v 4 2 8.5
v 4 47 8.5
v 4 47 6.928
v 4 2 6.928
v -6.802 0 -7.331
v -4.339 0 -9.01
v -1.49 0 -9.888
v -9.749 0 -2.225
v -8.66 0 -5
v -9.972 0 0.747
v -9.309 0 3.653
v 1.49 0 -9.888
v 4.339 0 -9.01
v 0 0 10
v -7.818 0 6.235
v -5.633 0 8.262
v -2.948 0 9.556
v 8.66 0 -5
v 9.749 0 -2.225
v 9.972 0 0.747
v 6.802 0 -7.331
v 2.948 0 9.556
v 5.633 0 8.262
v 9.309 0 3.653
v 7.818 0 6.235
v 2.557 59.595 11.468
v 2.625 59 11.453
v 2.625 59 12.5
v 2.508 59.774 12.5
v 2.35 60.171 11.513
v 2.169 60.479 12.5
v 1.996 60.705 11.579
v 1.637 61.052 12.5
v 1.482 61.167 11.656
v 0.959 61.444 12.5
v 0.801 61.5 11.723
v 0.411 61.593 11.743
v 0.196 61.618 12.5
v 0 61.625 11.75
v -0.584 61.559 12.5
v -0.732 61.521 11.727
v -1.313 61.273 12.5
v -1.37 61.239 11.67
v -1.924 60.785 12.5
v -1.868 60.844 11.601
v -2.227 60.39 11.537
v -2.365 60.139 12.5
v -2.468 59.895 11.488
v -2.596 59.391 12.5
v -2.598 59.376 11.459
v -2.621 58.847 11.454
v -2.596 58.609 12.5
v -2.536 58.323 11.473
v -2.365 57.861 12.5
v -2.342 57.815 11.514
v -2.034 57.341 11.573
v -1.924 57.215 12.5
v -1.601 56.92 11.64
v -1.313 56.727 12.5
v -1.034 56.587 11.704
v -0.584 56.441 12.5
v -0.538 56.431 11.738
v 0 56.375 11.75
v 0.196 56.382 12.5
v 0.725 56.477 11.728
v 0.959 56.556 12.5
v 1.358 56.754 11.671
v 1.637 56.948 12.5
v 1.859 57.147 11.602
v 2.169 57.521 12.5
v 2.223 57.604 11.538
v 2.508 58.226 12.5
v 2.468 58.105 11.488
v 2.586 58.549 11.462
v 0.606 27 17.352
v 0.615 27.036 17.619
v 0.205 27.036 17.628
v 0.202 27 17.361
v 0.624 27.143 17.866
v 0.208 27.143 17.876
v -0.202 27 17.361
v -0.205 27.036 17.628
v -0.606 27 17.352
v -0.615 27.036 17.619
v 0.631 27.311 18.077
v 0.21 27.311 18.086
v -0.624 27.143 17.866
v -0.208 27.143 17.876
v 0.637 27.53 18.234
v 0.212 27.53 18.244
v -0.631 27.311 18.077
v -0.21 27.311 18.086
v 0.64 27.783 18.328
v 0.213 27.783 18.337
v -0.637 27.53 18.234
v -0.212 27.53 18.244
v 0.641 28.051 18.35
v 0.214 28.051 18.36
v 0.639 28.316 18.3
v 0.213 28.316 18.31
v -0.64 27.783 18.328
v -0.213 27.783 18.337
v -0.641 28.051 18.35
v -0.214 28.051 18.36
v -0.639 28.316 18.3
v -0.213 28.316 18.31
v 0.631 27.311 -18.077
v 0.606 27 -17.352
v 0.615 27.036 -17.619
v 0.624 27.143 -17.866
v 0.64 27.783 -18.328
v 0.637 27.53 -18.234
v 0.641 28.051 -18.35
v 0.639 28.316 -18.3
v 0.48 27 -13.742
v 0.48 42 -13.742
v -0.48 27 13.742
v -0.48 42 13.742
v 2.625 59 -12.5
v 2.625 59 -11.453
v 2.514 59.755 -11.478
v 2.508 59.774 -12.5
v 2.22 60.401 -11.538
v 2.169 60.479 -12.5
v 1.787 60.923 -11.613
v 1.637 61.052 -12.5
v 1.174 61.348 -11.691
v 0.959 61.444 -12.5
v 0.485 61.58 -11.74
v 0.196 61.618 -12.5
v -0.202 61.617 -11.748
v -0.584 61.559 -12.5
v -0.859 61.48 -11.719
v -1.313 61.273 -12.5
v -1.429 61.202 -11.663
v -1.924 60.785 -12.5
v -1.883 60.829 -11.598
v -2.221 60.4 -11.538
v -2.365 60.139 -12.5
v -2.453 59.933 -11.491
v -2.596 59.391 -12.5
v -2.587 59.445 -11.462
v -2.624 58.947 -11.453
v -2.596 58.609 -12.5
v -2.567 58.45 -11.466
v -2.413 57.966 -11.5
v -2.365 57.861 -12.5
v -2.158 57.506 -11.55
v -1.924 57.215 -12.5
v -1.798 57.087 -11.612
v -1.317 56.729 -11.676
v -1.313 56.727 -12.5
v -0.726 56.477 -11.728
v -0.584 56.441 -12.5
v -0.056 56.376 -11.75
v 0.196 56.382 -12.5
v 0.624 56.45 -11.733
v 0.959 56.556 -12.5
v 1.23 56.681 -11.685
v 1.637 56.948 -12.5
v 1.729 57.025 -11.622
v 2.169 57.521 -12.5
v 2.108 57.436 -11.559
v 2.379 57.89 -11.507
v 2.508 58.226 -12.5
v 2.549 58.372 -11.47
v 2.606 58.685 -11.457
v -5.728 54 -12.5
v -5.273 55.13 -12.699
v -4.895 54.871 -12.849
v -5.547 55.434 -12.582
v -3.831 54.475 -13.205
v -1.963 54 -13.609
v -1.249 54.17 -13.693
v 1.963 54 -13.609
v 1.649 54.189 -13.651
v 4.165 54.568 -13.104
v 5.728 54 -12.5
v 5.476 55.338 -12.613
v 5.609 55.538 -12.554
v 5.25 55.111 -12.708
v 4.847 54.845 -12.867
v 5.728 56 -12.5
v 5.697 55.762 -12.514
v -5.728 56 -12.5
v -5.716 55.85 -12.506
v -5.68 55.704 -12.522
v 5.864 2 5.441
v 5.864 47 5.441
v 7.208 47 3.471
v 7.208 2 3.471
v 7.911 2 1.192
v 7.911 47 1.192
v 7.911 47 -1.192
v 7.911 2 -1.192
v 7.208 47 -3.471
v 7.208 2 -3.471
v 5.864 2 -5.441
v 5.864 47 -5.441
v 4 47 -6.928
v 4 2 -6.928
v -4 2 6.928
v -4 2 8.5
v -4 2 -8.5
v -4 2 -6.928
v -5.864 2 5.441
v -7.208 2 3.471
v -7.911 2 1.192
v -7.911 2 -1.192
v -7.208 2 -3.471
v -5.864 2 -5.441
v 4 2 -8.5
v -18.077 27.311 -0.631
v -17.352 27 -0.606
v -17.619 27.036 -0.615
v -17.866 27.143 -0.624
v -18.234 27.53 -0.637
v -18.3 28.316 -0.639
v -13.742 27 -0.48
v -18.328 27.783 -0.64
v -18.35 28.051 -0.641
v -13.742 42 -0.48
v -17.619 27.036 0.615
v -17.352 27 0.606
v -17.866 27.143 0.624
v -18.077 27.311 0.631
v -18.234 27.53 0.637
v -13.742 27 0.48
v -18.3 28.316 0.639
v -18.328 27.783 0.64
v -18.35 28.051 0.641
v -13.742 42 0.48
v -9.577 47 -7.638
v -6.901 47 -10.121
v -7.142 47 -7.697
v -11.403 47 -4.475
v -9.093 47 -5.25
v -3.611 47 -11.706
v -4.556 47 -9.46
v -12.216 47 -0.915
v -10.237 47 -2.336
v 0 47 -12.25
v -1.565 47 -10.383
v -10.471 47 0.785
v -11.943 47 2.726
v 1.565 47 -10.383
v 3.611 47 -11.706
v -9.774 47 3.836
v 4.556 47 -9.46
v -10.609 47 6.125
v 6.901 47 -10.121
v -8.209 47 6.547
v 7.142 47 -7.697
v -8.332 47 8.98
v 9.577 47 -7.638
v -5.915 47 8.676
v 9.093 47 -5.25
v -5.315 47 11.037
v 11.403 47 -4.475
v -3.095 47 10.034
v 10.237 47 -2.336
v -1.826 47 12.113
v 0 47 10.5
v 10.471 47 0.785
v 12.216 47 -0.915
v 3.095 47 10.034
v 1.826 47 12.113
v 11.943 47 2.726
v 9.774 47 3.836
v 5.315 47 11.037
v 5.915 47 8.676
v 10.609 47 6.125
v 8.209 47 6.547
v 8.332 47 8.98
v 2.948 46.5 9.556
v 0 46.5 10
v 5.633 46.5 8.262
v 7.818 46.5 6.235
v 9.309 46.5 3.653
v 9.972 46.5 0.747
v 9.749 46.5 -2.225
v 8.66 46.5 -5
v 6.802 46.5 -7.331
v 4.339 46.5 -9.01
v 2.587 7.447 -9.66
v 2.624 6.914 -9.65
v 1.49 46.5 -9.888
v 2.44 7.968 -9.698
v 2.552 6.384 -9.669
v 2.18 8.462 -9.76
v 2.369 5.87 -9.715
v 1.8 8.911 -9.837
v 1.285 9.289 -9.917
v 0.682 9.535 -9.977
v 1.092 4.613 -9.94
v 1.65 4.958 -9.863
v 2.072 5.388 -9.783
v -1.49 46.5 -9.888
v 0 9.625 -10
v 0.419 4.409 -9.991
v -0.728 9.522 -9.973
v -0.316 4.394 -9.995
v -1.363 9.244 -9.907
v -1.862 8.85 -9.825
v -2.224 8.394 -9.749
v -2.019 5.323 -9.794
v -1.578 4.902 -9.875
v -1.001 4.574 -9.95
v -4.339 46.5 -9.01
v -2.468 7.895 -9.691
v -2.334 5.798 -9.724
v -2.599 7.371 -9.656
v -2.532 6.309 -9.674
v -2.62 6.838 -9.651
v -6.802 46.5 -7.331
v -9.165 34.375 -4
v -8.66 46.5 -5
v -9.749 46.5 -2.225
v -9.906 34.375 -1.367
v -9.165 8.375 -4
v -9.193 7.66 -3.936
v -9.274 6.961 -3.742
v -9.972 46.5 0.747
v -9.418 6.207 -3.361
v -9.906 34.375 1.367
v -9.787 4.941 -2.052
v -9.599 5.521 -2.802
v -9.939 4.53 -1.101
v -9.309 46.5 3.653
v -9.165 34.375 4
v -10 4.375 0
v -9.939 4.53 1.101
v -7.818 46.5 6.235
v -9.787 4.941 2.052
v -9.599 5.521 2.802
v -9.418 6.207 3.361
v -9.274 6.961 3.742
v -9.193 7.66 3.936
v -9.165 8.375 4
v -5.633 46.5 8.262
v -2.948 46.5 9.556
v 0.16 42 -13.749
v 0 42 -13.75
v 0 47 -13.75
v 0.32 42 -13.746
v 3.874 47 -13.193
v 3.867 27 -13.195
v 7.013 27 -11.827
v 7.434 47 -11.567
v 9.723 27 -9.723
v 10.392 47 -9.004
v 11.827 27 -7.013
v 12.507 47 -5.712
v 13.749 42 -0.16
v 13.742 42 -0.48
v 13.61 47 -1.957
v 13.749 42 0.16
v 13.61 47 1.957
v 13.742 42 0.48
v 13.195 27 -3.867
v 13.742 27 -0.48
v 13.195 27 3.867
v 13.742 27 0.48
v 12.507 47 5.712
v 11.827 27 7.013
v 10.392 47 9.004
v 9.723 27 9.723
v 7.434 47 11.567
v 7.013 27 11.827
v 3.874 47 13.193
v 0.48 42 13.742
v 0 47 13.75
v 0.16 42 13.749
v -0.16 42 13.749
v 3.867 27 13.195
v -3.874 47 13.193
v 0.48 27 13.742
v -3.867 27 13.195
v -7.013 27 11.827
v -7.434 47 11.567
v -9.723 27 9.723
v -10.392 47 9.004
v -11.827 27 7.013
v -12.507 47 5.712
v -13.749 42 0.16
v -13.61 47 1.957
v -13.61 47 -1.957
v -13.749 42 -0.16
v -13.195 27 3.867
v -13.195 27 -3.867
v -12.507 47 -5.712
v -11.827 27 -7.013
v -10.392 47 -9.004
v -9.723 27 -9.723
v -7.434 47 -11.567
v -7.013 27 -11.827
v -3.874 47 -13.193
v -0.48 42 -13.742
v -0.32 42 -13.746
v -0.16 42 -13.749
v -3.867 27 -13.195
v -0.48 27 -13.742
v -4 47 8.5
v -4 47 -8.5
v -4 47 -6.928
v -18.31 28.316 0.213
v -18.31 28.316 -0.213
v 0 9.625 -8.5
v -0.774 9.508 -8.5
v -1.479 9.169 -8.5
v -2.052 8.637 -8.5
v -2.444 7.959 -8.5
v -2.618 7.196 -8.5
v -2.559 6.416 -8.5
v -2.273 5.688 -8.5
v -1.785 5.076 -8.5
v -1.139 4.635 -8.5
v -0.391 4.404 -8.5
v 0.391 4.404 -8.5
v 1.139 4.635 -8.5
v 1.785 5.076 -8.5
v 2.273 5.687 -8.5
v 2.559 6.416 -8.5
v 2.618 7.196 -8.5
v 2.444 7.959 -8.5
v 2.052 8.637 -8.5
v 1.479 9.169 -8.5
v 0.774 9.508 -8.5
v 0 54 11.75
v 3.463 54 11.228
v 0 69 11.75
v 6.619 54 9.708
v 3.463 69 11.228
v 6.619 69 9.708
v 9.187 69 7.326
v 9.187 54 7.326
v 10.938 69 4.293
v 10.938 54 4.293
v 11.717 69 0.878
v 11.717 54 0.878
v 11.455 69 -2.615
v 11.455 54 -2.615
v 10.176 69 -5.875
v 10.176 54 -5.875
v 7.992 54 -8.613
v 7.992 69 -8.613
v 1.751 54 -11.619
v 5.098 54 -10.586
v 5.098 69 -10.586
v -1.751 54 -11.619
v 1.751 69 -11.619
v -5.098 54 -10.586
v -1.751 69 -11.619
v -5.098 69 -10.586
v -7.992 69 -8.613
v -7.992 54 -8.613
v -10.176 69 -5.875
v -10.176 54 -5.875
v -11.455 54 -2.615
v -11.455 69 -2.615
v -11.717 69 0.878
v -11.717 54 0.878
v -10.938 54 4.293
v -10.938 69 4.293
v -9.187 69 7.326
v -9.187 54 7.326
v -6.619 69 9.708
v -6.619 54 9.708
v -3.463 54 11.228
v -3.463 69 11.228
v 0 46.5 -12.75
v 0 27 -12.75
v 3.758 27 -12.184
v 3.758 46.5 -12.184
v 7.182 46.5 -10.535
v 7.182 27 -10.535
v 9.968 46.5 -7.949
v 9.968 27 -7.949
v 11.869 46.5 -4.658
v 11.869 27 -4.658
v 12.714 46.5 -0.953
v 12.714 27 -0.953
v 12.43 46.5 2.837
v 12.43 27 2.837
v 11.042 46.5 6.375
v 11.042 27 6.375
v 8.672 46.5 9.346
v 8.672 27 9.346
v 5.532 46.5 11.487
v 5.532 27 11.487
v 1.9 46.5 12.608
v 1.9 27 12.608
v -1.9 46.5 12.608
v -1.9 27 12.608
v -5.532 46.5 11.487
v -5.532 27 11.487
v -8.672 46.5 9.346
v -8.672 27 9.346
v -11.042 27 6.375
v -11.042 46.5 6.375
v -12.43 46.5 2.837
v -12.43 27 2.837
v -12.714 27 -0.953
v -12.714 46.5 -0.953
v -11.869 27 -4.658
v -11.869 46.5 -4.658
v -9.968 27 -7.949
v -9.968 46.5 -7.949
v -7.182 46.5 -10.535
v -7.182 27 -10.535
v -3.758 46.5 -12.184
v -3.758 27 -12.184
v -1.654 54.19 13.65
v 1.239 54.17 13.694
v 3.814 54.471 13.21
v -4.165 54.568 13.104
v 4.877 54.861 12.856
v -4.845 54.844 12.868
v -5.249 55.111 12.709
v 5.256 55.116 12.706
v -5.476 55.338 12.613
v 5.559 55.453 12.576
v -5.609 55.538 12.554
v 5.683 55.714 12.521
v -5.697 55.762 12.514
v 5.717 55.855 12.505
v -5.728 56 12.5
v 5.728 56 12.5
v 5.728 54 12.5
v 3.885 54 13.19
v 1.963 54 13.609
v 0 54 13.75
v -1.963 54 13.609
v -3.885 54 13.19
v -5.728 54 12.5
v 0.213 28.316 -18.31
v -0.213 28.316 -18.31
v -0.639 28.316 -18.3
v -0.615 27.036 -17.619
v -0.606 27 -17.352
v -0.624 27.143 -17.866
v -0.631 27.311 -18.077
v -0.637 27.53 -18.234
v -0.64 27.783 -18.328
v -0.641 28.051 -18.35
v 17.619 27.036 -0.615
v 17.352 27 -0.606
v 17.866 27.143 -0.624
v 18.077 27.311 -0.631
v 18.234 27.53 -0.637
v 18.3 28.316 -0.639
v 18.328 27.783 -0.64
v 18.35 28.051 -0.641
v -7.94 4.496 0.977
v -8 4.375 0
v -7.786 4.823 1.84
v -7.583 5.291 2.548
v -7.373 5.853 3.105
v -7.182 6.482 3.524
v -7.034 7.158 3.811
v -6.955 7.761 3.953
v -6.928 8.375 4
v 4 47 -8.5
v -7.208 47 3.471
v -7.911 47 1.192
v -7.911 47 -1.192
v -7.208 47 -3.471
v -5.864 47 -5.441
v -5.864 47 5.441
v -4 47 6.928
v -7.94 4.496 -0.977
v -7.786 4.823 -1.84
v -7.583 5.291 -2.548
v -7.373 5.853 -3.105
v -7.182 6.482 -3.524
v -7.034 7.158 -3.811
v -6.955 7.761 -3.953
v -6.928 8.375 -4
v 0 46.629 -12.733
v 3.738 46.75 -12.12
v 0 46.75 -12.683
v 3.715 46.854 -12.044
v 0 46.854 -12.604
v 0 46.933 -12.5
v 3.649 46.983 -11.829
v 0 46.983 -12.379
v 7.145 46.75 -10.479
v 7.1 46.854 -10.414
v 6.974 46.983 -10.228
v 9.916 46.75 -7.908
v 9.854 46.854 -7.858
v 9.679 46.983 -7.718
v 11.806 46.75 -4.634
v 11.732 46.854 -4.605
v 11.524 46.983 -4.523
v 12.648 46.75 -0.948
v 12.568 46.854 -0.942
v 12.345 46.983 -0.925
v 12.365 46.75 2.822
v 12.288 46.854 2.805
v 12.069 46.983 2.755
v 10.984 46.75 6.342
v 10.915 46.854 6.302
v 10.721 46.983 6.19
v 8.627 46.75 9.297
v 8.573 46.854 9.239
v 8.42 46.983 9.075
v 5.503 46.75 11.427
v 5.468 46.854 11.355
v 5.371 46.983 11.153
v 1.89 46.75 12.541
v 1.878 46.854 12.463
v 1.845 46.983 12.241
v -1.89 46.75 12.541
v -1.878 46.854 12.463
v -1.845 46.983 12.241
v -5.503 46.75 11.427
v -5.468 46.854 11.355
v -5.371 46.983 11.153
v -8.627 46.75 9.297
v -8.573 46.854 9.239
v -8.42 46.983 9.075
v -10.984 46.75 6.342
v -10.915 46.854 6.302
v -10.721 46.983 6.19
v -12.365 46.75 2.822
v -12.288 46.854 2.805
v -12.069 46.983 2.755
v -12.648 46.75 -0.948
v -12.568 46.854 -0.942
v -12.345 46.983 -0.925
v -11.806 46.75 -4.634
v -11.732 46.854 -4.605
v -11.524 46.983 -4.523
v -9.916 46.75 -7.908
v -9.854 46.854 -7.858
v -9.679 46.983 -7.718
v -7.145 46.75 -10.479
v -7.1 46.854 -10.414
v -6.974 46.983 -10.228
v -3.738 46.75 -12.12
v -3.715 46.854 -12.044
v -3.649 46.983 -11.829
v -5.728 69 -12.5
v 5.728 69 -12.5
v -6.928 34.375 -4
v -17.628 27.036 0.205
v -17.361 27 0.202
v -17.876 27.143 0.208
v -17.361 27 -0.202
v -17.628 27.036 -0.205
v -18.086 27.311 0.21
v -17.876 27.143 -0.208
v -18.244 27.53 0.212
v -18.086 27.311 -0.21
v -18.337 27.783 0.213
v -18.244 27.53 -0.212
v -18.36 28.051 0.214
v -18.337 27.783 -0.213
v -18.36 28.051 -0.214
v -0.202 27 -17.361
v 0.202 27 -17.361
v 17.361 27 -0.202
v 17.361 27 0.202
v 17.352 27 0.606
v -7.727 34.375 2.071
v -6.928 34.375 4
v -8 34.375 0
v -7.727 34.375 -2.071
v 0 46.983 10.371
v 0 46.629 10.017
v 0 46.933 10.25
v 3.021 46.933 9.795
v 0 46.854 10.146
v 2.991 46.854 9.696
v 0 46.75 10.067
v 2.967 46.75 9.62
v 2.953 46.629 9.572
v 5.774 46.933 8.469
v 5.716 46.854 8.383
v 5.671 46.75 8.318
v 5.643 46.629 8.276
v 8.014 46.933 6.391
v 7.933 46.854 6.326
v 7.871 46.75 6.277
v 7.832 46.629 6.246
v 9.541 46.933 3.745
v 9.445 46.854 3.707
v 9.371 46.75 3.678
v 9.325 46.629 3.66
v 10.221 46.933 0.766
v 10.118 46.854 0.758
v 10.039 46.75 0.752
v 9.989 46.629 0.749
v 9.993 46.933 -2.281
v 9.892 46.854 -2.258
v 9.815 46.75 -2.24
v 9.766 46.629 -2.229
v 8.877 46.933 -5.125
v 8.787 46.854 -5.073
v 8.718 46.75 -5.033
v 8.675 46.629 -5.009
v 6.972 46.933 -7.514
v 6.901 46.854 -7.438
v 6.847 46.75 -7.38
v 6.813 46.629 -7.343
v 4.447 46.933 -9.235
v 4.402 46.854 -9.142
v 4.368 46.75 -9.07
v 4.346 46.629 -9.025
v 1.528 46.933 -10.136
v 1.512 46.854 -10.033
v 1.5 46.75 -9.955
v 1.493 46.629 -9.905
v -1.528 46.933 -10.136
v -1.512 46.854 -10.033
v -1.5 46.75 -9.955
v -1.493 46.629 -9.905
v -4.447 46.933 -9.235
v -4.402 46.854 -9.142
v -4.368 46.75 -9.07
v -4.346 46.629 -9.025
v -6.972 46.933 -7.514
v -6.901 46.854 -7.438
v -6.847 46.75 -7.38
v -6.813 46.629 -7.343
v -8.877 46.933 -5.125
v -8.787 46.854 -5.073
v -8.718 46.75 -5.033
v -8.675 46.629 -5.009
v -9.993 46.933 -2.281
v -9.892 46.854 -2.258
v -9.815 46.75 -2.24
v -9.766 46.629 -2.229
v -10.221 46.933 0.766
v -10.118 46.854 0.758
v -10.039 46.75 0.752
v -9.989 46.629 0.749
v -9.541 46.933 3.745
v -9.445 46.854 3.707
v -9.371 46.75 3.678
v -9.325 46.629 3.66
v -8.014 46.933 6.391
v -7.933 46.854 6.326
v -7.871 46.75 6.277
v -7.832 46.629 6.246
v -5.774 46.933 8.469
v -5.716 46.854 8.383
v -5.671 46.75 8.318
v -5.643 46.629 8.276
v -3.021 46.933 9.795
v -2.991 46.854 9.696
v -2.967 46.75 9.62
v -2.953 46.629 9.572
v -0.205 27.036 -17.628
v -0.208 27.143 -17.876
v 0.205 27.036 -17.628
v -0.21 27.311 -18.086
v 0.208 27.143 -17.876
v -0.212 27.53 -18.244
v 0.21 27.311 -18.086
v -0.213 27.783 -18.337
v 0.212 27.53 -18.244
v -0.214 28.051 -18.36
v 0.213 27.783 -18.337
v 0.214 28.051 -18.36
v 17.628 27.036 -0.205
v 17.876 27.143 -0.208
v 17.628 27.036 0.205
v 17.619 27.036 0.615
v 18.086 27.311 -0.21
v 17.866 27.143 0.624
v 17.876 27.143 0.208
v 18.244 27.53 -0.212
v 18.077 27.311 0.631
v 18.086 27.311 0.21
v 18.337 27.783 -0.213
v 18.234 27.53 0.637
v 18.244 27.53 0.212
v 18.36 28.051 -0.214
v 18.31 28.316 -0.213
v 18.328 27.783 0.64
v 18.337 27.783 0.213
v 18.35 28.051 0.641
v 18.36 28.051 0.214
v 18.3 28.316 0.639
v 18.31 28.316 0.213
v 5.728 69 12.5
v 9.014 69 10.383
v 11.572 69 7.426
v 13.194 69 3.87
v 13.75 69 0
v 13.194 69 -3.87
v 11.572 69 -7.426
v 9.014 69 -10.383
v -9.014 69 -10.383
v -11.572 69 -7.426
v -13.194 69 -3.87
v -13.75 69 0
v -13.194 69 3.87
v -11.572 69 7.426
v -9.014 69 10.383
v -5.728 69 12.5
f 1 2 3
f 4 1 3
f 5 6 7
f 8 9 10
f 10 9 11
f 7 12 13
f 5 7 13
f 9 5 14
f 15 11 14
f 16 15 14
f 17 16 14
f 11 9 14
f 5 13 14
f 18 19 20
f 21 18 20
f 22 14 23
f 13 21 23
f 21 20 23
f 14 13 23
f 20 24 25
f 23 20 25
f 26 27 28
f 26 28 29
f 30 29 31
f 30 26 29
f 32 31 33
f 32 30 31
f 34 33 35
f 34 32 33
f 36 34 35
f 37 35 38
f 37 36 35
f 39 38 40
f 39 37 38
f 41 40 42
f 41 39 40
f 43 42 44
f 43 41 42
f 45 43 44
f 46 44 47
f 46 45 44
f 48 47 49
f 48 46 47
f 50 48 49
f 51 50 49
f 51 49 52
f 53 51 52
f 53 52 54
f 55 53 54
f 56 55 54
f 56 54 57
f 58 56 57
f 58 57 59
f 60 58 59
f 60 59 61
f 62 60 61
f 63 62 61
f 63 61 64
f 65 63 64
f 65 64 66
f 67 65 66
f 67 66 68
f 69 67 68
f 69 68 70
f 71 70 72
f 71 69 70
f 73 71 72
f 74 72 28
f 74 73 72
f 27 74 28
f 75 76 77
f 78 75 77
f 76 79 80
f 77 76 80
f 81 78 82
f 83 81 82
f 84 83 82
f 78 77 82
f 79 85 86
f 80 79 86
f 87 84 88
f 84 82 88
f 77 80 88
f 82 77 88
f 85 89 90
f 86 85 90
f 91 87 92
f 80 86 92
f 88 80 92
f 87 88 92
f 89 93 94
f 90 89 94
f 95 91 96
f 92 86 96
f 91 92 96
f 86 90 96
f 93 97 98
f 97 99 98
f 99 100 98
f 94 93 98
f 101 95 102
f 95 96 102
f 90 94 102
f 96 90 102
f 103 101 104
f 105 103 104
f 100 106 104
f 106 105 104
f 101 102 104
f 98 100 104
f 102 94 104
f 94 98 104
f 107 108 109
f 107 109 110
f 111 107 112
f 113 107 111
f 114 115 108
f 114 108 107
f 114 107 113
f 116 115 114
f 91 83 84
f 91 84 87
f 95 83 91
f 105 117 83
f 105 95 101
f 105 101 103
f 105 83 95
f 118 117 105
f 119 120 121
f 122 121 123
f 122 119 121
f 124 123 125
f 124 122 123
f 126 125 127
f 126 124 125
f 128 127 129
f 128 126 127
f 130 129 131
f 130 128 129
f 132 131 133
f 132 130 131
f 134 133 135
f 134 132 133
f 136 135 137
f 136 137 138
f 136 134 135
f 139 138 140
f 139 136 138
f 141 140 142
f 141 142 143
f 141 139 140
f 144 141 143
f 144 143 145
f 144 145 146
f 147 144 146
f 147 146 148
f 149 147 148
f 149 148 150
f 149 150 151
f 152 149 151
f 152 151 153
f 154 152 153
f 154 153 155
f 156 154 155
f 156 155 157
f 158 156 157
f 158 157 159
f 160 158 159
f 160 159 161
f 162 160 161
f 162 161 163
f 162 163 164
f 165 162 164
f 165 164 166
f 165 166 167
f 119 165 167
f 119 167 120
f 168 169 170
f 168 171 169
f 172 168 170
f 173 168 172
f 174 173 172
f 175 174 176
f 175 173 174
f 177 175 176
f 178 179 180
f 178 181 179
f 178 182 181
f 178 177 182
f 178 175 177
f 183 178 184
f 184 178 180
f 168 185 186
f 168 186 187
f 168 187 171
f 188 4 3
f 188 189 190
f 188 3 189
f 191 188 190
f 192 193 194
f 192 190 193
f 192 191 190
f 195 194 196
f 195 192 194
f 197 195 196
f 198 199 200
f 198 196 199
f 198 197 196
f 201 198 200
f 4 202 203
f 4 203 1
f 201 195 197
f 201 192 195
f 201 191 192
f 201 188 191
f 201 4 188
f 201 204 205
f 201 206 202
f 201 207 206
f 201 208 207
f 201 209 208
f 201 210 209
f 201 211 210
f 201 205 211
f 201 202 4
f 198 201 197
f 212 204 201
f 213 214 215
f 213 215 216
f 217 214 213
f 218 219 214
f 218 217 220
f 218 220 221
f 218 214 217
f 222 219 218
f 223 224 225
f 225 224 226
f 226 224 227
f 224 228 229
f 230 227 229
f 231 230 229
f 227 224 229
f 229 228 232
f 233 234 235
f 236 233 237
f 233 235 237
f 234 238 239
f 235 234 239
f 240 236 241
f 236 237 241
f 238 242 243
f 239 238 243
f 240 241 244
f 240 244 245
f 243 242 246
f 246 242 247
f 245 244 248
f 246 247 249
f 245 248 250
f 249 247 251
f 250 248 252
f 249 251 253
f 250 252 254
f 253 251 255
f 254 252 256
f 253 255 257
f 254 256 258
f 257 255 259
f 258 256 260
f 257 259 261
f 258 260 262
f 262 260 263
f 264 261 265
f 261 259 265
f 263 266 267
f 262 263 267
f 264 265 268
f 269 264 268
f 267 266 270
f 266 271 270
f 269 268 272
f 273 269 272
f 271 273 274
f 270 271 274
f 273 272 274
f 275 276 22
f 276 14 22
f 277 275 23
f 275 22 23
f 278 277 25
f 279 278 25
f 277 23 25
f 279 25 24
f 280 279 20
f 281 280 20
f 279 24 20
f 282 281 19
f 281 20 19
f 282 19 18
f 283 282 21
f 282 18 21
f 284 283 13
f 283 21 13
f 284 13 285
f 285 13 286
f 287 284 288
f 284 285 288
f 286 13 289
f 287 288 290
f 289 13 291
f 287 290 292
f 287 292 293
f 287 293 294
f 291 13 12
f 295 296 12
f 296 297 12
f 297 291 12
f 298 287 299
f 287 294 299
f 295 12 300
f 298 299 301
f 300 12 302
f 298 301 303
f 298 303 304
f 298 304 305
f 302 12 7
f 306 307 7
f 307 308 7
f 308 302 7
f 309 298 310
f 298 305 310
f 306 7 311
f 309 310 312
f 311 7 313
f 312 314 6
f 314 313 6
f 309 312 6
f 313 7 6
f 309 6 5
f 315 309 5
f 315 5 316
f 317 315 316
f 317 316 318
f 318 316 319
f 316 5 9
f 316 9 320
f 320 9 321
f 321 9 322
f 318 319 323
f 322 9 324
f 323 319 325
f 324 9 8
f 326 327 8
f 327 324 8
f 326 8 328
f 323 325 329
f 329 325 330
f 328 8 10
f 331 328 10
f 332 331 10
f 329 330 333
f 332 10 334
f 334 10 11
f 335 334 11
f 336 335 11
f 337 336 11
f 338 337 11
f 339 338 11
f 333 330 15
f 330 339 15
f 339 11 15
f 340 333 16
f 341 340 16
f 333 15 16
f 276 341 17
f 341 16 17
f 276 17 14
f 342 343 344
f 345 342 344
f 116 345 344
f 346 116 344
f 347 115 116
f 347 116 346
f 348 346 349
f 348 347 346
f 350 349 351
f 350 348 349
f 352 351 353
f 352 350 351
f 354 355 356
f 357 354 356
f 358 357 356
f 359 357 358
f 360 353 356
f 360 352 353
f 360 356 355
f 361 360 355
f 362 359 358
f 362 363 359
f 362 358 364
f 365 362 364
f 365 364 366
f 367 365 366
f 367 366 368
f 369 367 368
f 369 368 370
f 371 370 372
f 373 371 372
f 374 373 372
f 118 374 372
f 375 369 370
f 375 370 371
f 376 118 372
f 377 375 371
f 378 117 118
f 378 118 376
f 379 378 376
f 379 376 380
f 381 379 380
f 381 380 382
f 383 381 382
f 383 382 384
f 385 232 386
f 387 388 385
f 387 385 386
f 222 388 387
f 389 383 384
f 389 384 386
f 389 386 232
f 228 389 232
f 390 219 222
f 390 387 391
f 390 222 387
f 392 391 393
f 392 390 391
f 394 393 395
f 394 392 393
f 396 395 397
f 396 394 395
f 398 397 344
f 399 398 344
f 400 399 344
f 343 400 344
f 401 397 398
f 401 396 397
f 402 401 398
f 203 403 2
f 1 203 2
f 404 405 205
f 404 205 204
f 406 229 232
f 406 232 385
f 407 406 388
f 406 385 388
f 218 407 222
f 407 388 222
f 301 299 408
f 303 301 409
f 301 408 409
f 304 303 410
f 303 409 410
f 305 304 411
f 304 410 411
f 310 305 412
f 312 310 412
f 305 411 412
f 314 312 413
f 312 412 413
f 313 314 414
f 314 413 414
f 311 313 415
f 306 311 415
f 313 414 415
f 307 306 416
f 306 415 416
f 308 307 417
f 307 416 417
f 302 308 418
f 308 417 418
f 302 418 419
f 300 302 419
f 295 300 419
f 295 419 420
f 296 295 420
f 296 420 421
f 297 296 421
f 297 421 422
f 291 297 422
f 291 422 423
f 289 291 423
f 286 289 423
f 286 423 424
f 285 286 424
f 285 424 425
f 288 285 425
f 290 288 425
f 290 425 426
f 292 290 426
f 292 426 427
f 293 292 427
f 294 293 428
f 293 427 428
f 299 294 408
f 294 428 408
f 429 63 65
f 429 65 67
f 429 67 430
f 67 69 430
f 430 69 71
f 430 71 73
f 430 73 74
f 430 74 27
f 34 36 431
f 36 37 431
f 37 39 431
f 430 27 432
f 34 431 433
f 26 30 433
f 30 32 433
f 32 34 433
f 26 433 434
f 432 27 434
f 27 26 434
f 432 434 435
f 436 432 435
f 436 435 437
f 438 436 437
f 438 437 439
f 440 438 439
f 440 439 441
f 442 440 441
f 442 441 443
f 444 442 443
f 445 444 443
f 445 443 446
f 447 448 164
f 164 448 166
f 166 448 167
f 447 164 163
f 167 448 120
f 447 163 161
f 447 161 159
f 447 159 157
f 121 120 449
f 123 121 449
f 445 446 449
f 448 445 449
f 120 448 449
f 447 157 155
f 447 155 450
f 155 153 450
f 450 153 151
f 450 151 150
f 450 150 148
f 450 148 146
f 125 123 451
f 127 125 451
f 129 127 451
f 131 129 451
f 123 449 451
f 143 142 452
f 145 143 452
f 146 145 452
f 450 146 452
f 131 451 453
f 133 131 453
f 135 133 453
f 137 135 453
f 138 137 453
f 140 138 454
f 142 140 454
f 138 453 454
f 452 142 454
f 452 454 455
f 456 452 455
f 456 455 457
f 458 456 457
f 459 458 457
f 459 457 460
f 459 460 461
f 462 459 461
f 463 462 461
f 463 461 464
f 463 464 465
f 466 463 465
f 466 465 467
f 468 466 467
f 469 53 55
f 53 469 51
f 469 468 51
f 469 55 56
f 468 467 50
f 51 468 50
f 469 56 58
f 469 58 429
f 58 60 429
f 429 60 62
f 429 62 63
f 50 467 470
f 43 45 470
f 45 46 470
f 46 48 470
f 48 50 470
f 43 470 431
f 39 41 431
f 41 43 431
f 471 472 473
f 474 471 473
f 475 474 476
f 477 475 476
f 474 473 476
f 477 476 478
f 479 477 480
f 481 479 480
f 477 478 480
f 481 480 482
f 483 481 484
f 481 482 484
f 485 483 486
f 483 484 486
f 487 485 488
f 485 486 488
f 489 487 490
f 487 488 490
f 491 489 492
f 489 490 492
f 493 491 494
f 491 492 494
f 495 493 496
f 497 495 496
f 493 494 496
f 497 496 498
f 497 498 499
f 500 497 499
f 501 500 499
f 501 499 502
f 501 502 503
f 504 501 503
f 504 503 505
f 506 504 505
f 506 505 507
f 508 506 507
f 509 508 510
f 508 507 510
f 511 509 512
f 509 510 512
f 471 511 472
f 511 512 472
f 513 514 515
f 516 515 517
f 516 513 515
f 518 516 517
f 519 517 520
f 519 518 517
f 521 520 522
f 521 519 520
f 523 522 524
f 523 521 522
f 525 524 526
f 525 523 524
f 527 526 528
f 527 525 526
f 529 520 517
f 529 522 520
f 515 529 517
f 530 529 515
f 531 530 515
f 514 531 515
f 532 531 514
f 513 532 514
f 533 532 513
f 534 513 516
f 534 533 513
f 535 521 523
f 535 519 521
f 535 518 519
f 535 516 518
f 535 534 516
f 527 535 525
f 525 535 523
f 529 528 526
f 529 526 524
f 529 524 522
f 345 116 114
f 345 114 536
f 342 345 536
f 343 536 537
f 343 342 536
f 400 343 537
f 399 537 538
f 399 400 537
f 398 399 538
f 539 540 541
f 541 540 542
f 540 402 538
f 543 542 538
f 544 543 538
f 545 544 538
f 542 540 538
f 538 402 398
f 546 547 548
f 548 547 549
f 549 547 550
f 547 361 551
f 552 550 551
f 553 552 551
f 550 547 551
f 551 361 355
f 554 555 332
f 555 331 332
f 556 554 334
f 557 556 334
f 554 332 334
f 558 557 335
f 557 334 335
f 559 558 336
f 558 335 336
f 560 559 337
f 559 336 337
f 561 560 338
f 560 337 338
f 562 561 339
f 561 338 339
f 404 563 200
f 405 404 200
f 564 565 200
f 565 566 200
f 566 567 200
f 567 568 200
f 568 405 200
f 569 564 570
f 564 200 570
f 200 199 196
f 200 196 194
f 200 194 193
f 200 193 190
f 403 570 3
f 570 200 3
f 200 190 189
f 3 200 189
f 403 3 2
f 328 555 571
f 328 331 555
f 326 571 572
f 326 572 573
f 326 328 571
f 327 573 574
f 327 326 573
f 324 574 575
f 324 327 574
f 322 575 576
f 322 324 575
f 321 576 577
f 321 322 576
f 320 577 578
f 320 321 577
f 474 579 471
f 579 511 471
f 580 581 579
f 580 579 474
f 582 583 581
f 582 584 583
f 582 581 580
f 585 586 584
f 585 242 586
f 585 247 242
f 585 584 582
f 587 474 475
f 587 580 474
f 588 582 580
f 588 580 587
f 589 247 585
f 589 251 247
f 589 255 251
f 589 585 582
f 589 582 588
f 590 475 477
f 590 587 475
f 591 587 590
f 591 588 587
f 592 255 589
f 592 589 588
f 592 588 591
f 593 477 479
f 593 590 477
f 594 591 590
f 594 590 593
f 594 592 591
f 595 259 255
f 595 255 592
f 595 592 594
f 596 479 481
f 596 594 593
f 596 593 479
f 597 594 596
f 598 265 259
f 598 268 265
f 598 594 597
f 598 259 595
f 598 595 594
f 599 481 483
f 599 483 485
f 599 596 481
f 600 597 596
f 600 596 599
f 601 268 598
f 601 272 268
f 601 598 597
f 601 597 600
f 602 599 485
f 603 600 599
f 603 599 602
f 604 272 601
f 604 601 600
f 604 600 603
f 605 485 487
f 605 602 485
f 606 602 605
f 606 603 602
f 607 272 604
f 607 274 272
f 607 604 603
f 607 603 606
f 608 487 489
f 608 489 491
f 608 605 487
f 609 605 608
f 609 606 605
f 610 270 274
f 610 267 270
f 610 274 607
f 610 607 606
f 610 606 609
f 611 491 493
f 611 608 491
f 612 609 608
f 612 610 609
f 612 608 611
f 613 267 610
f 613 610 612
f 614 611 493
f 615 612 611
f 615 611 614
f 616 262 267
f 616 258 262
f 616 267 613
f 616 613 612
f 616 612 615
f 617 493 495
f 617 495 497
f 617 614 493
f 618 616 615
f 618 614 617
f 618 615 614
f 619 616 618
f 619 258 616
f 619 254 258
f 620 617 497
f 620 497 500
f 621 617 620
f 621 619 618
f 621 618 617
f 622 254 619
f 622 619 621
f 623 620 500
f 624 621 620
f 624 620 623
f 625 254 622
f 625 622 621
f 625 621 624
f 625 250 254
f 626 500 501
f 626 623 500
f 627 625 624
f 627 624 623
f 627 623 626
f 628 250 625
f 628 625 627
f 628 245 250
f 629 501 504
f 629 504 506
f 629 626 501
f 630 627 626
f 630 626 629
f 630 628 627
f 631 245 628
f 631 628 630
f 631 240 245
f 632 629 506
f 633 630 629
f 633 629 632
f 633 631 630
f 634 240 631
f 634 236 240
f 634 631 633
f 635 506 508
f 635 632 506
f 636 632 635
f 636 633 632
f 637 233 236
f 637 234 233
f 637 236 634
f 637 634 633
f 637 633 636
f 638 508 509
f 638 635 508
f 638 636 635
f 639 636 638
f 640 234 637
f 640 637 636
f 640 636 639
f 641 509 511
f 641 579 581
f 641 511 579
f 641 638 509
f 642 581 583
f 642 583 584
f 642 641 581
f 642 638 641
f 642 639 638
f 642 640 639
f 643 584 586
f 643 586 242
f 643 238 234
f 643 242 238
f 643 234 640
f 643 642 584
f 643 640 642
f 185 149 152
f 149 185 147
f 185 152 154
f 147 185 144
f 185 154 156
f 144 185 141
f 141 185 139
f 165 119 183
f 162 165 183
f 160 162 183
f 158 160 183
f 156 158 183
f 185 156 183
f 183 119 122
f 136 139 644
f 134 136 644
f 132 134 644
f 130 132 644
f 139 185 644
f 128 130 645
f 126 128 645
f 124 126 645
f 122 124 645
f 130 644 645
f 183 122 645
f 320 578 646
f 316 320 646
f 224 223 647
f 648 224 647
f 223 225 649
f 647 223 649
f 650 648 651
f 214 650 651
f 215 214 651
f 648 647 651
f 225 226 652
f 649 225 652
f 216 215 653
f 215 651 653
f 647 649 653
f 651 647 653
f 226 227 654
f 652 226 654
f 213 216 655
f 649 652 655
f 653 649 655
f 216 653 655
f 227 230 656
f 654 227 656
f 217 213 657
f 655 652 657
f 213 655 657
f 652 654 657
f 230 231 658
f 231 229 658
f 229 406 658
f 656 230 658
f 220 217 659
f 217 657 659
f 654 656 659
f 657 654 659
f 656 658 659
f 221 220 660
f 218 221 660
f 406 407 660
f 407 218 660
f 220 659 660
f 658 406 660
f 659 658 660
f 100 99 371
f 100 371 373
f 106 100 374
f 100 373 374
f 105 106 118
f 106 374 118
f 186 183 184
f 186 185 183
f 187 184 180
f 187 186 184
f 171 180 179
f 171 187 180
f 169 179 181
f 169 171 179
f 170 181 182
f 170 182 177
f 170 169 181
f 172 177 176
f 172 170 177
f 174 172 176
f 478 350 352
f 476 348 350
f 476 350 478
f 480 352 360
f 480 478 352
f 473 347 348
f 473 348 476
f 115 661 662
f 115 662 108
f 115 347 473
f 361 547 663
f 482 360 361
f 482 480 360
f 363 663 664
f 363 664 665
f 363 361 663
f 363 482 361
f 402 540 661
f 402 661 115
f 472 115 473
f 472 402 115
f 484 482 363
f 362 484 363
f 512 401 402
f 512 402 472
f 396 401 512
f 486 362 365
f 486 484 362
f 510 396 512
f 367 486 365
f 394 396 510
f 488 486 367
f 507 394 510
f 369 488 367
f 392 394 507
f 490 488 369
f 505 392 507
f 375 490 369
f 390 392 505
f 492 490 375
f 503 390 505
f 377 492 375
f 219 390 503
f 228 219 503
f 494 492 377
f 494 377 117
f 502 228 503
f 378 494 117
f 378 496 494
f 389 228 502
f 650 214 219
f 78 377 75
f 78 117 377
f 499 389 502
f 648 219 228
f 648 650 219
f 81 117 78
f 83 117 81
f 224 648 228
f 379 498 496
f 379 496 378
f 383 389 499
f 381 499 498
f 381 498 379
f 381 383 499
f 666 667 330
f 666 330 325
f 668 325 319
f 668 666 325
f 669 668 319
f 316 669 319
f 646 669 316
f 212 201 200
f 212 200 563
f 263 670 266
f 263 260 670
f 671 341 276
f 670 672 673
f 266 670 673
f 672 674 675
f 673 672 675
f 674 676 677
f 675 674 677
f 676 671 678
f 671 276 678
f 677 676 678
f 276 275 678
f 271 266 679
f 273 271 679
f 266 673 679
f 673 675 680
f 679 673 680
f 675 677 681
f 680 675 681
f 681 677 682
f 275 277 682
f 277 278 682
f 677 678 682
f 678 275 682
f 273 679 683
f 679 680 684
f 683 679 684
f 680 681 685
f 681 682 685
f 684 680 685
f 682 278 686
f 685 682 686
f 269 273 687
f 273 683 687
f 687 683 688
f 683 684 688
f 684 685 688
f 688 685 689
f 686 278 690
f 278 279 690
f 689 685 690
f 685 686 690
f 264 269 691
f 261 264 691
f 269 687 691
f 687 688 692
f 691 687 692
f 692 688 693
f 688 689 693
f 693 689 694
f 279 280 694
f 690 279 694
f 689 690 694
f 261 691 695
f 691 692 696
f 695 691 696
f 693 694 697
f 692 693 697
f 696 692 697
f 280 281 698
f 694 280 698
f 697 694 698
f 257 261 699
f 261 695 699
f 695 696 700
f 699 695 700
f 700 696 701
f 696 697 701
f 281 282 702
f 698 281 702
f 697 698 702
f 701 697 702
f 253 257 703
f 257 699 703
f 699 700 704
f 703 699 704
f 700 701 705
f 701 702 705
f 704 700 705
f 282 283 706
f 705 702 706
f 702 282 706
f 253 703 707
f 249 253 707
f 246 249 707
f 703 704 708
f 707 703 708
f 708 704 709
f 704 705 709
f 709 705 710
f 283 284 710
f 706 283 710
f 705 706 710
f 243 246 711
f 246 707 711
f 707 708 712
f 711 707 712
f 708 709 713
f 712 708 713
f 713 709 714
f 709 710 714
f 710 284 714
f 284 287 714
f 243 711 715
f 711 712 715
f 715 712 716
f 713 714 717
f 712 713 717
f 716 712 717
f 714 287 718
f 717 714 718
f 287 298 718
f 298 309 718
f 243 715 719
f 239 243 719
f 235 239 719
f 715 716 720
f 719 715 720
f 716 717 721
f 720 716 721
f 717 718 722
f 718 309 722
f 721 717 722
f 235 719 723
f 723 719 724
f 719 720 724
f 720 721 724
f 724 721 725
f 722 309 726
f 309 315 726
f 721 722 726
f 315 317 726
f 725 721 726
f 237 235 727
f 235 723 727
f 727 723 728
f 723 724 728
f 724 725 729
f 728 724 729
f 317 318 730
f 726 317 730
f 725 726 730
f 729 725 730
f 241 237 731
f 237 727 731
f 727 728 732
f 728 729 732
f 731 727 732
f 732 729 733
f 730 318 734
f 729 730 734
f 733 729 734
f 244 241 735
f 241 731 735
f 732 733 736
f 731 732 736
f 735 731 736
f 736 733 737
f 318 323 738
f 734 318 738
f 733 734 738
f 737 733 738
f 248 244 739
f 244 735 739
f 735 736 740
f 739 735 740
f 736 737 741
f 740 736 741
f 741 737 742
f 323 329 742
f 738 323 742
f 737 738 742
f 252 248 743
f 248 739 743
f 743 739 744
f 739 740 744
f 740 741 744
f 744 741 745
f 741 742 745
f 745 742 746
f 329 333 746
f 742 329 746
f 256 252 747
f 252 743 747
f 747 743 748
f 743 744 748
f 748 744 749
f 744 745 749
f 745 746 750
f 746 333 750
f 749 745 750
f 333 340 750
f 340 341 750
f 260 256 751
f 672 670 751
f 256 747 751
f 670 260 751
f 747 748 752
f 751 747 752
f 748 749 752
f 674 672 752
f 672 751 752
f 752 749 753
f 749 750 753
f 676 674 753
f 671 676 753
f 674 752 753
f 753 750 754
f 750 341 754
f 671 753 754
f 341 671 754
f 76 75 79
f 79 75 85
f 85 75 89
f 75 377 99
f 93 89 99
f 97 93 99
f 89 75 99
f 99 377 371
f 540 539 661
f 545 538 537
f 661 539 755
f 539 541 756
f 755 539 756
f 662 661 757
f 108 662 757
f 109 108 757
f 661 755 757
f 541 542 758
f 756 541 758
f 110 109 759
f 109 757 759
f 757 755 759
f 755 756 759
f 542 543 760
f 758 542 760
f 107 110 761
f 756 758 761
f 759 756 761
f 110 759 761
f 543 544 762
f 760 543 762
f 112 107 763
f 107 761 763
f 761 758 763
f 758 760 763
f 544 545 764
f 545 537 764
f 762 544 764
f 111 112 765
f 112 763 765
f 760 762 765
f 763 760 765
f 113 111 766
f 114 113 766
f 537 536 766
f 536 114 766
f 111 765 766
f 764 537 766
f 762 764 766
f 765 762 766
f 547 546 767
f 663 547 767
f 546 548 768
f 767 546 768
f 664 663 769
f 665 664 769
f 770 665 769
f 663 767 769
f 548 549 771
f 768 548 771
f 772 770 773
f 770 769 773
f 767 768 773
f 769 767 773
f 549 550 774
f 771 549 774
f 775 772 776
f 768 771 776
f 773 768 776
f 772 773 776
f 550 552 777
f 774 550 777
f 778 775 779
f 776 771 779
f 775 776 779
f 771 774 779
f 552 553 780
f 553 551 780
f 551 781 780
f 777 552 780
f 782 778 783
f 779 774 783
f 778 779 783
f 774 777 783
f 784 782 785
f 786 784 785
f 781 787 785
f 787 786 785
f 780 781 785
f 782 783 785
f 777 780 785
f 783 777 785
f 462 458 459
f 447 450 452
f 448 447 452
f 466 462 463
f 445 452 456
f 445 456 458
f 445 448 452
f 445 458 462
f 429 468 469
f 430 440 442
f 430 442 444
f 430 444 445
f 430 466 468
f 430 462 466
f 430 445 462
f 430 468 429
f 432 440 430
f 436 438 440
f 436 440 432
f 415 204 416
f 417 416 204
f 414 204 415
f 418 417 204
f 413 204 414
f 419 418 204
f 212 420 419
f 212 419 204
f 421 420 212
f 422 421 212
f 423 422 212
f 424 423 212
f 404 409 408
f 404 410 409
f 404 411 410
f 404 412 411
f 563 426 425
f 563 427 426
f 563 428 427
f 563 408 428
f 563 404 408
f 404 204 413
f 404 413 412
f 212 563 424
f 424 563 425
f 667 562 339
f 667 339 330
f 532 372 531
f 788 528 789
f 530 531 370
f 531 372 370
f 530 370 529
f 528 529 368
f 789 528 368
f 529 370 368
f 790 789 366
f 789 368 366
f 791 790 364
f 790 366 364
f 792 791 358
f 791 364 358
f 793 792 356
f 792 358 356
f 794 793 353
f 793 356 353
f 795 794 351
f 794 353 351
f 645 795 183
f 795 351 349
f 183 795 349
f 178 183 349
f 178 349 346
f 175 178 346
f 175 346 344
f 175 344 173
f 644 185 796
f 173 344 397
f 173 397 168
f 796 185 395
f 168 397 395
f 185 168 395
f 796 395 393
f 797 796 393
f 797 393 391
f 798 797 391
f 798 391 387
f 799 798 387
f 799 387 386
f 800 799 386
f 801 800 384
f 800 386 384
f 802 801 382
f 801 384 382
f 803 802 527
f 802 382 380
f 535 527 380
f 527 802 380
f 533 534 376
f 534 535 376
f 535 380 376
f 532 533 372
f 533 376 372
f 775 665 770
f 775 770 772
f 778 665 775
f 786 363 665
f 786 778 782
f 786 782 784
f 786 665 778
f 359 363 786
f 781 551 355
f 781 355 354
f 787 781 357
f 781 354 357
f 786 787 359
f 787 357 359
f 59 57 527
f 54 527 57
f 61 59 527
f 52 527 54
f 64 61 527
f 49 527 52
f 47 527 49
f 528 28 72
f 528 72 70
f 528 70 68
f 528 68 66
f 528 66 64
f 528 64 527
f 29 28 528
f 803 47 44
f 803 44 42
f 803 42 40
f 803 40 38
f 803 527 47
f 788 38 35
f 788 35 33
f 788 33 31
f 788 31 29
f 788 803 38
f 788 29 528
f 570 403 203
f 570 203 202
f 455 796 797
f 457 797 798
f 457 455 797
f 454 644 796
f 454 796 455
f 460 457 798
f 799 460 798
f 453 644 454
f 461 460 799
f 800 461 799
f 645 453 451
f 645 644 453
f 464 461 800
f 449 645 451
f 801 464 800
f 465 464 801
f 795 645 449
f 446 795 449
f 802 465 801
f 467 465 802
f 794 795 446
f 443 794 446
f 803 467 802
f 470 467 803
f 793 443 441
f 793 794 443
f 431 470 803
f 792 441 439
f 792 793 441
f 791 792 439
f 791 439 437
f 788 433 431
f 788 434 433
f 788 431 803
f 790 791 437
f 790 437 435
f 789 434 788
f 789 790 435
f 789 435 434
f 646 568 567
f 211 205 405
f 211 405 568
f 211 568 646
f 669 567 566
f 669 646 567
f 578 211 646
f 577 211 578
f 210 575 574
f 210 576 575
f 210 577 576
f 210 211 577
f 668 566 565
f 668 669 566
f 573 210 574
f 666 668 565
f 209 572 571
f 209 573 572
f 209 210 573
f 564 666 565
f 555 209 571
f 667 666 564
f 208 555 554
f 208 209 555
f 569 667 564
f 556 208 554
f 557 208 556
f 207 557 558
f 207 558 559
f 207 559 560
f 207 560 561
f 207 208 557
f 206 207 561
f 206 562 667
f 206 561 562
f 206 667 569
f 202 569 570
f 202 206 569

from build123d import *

# Parameters (mm, degrees)
SKETCH1_R                = 10
BOSS_EXTRUDE1_DEPTH      = 47
SHELL1_T                 = -2
SKETCH2_W                = 8
SKETCH2_H                = 17
CUT_EXTRUDE1_DEPTH       = 45
SKETCH3_R                = 2.625
CUT_EXTRUDE2_DEPTH       = 50.081564767
SKETCH4_R                = 13.75
BOSS_EXTRUDE2_DEPTH      = 22
BOSS_EXTRUDE3_START      = 20
SKETCH5_R                = 13.75
SKETCH5_R_2              = 12.75
BOSS_EXTRUDE3_DEPTH      = 20
FILLET1_R                = 0.5
SKETCH6_W                = 8
SKETCH6_H                = 30
CUT_EXTRUDE3_DEPTH       = 10
FILLET2_R                = 4
REVOLVE5_ANGLE           = 4
FILLET3_R                = 1
CIRPATTERN1_COUNT        = 4
FILLET3_OF_CIRPATTERN1_R = 1
SKETCH9_R                = 11.75
CUT_EXTRUDE4_DEPTH       = 15
CUT_EXTRUDE6_DEPTH       = 74.724950074
CUT_EXTRUDE6_DEPTH_BACK  = 74.724950074
SKETCH10_R               = 2.625
SKETCH11_W               = 15
SKETCH11_H               = 2
CUT_EXTRUDE7_DEPTH       = 15
FILLET4_R                = 2


# Some blends are built 0.0001 mm under size
with BuildPart() as part:
    # Sketch1 → Boss-Extrude1 (new body)
    with BuildSketch(Plane(origin=(0, 0, 0), x_dir=(1, 0, 0), z_dir=(0, 1, 0))):
        with Locations(Location((0, 0, 0), (0, 0, 270))):
            Circle(SKETCH1_R)
    extrude(amount=BOSS_EXTRUDE1_DEPTH)

    # Shell1
    shell1_openings = [part.faces().sort_by_distance(p)[0] for p in [
        (0, 47, 0),
    ]]
    offset(amount=SHELL1_T, openings=shell1_openings, kind=Kind.INTERSECTION)

    # Sketch2 → Cut-Extrude1 (cut)
    with BuildSketch(Plane(origin=(0, 47, 0), x_dir=(1, 0, 0), z_dir=(0, 1, 0))):
        Rectangle(SKETCH2_W, SKETCH2_H)
    extrude(amount=-CUT_EXTRUDE1_DEPTH, mode=Mode.SUBTRACT)

    # Sketch3 → Cut-Extrude2 (cut, through all)
    with BuildSketch(Plane.XY):
        with Locations(Location((0, 7, 0), (0, 0, 90))):
            Circle(SKETCH3_R)
    extrude(amount=-CUT_EXTRUDE2_DEPTH, mode=Mode.SUBTRACT)

    # Sketch4 → Boss-Extrude2 (add)
    with BuildSketch(Plane(origin=(0, 47, 0), x_dir=(1, 0, 0), z_dir=(0, 1, 0))):
        with Locations(Location((0, 0, 0), (0, 0, 270))):
            Circle(SKETCH4_R)
    extrude(amount=BOSS_EXTRUDE2_DEPTH)

    # Sketch5 → Boss-Extrude3 (add)
    with BuildSketch(Plane.XZ.offset(-47).offset(BOSS_EXTRUDE3_START)):
        with Locations(Location((0, 0, 0), (0, 0, 270))):
            Circle(SKETCH5_R)
        with Locations(Location((0, 0, 0), (0, 0, 270))):
            Circle(SKETCH5_R_2, mode=Mode.SUBTRACT)
    extrude(amount=-BOSS_EXTRUDE3_DEPTH)

    # Fillet1
    fillet1_edges = [part.edges().sort_by_distance(p)[0] for p in [
        (0, 47, -10),
        (0, 47, 12.75),
    ]]
    fillet(fillet1_edges, radius=FILLET1_R)

    # Sketch6 → Cut-Extrude3 (cut)
    with BuildSketch(Plane(origin=(0, 0, 0), x_dir=(0, 0, -1), z_dir=(1, 0, 0))):
        with Locations((0, 19.375)):
            Rectangle(SKETCH6_W, SKETCH6_H)
    extrude(amount=-CUT_EXTRUDE3_DEPTH, mode=Mode.SUBTRACT)

    # Fillet2
    fillet2_edges = [part.edges().sort_by_distance(p)[0] for p in [
        (-8.04667731, 4.375, 4),
        (-8.04667731, 4.375, -4),
    ]]
    fillet(fillet2_edges, radius=FILLET2_R - 0.0001)  # a hair under: the kernel refuses the full size

    # Sketch8 → Revolve5 (revolve, symmetric)
    with BuildSketch(Plane(origin=(0, 0, 0), x_dir=(0, 0, -1), z_dir=(1, 0, 0))) as revolve5_sk:
        Polygon((13.75, 27), (18.75, 27), (13.75, 42), align=None)
    revolve5 = revolve(axis=Axis((0, 88.2, 0), (0, -1, 0)), revolution_arc=REVOLVE5_ANGLE / 2)
    revolve5 = revolve5 + revolve(revolve5_sk.sketch, axis=Axis((0, 88.2, 0), (0, 1, 0)), revolution_arc=REVOLVE5_ANGLE / 2)

    # Fillet3
    fillet3_edges = [part.edges().sort_by_distance(p)[0] for p in [
        (0, 27, -18.75),
    ]]
    fillet(fillet3_edges, radius=FILLET3_R)

    # CirPattern1: Revolve5 ×4 about axis
    cirpattern1_axis = Axis((0, 88.2, 0), (0, -1, 0))
    for i in range(1, CIRPATTERN1_COUNT):
        add(revolve5.rotate(cirpattern1_axis, i * 360 / CIRPATTERN1_COUNT))

    # Fillet3 of CirPattern1
    fillet3_of_cirpattern1_edges = [part.edges().sort_by_distance(p)[0] for p in [
        (18.75, 27, 0),
        (0, 27, 18.75),
        (-18.75, 27, 0),
    ]]
    fillet(fillet3_of_cirpattern1_edges, radius=FILLET3_OF_CIRPATTERN1_R)

    # Sketch9 → Cut-Extrude4 (cut)
    with BuildSketch(Plane(origin=(0, 69, 0), x_dir=(1, 0, 0), z_dir=(0, 1, 0))):
        with Locations(Location((0, 0, 0), (0, 0, 270))):
            Circle(SKETCH9_R)
    extrude(amount=-CUT_EXTRUDE4_DEPTH, mode=Mode.SUBTRACT)

    # Sketch10 → Cut-Extrude6 (cut, two sides: drawn at the far end of the back side and taken through both)
    with BuildSketch(Plane.XY.offset(-CUT_EXTRUDE6_DEPTH_BACK)):
        with Locations((0, 59)):
            Circle(SKETCH10_R)
    extrude(amount=CUT_EXTRUDE6_DEPTH + CUT_EXTRUDE6_DEPTH_BACK, mode=Mode.SUBTRACT)

    # Sketch11 → Cut-Extrude7 (cut)
    with BuildSketch(Plane(origin=(0, 69, 0), x_dir=(1, 0, 0), z_dir=(0, 1, 0))):
        with Locations((0, -13.5)):
            Rectangle(SKETCH11_W, SKETCH11_H)
    cut_extrude7 = extrude(amount=-CUT_EXTRUDE7_DEPTH, mode=Mode.SUBTRACT)

    # Mirror1: Cut-Extrude7 across plane
    add(cut_extrude7.mirror(Plane.XY), mode=Mode.SUBTRACT)

    # Fillet4
    # the kernel refuses this fillet: 2 mm, written as the material it adds along each edge
    with BuildSketch(Plane(origin=(-10.728219619, 54, -12.5), x_dir=(0, 1, 0), z_dir=(1, 0, 0))) as fillet4_piece_1_section:
        with BuildLine():
            CenterArc((FILLET4_R, -FILLET4_R), FILLET4_R, 90, 90)
            Line((0, -FILLET4_R), (0, 0))
            Line((0, 0), (FILLET4_R, 0))
        make_face()
    fillet4_piece_1 = extrude(amount=21.456439237, mode=Mode.PRIVATE)
    fillet4_piece_1 = fillet4_piece_1 & Plane(origin=(0, 54.536479762, 0), x_dir=(0, 0, 1), z_dir=(0, -1, 0)) * Cylinder(13.75, 51, mode=Mode.PRIVATE)
    add(fillet4_piece_1)
    with BuildSketch(Plane(origin=(-10.728219619, 54, 12.5), x_dir=(0, 0, 1), z_dir=(1, 0, 0))) as fillet4_piece_2_section:
        with BuildLine():
            CenterArc((FILLET4_R, -FILLET4_R), FILLET4_R, 90, 90)
            Line((0, -FILLET4_R), (0, 0))
            Line((0, 0), (FILLET4_R, 0))
        make_face()
    fillet4_piece_2 = extrude(amount=21.456439237, mode=Mode.PRIVATE)
    fillet4_piece_2 = fillet4_piece_2 & Plane(origin=(0, 54.536497639, 0), x_dir=(0, 0, 1), z_dir=(0, -1, 0)) * Cylinder(13.75, 51, mode=Mode.PRIVATE)
    add(fillet4_piece_2)


solid = part.part
